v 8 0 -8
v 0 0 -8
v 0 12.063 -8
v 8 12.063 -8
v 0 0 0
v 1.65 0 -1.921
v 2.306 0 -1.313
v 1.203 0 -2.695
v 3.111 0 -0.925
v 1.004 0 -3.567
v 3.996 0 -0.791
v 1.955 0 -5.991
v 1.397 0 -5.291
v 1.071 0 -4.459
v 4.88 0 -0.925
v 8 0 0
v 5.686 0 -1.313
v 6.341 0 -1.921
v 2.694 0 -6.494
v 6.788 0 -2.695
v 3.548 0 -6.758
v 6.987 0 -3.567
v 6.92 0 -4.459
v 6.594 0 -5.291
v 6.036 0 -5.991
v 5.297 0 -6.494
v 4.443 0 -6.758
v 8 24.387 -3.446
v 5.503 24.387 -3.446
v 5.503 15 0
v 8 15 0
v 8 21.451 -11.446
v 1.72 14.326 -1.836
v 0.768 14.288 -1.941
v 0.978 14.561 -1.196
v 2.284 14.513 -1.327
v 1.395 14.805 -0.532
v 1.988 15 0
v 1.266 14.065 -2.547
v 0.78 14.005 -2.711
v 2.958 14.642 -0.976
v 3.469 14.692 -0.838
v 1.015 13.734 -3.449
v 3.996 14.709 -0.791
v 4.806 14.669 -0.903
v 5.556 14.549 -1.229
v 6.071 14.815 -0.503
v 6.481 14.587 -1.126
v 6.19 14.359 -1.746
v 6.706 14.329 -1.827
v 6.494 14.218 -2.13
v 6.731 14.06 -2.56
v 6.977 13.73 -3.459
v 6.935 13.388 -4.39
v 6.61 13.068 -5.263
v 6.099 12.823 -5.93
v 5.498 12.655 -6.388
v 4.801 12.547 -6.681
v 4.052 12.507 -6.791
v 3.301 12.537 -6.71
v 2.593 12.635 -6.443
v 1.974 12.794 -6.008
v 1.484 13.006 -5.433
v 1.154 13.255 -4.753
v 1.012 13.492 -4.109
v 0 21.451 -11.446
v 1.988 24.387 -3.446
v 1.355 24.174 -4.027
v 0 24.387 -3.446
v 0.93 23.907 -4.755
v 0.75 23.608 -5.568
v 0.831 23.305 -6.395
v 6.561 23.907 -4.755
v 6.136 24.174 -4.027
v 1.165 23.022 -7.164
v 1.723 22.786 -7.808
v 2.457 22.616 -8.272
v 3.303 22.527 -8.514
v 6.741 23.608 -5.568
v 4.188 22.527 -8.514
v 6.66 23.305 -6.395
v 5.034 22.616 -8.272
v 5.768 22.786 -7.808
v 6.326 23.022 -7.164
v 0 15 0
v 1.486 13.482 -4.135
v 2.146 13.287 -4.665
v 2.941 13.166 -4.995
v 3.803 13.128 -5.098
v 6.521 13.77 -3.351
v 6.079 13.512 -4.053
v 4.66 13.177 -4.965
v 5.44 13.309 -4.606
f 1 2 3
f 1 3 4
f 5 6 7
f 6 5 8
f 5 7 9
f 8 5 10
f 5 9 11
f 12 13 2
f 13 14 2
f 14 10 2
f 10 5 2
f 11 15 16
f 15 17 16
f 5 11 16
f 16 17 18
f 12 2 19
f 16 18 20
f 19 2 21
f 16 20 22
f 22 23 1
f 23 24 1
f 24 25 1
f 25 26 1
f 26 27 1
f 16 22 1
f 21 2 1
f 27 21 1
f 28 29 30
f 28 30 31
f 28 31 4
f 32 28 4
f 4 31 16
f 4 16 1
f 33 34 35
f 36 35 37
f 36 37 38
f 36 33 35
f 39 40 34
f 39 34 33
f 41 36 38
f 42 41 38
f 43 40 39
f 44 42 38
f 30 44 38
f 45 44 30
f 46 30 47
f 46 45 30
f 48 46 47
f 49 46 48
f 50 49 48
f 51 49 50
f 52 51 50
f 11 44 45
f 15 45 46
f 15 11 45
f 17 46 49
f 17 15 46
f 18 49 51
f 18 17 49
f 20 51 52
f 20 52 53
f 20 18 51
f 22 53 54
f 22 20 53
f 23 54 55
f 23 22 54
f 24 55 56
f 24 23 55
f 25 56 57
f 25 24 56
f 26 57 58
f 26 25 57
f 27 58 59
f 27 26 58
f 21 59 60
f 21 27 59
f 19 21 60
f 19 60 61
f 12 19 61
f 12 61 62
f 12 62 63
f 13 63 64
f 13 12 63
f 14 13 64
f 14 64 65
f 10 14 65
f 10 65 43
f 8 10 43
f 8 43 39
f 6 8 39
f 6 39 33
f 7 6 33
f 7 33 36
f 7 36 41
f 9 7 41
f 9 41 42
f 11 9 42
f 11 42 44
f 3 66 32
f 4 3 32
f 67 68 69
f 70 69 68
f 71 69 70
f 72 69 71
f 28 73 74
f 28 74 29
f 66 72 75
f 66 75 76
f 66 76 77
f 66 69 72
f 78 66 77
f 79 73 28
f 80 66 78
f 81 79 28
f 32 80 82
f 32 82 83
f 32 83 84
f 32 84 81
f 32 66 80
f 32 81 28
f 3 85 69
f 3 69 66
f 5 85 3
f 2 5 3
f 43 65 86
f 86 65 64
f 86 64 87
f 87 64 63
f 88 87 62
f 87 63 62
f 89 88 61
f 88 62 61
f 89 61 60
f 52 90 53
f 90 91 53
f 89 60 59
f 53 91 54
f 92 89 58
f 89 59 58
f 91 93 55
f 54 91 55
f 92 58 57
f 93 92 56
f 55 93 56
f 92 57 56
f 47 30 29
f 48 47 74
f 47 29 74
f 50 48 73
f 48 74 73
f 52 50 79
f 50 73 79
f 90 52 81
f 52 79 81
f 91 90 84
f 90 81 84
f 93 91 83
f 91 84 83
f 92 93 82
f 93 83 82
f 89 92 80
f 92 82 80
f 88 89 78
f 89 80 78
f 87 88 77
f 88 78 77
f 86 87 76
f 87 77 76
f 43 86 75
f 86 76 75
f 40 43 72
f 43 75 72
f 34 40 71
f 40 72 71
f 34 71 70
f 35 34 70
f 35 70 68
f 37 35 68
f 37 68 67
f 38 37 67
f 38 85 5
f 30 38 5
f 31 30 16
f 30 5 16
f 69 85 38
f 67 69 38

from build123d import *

# Parameters (mm, degrees)
SKETCH1_W           = 8
SKETCH1_H           = 8
SKETCH1_R           = 3
BOSS_EXTRUDE3_DEPTH = 15
CUT_EXTRUDE1_DEPTH  = 8
SKETCH4_W           = 8
SKETCH4_H           = 8.522050623
BOSS_EXTRUDE4_DEPTH = 10
SKETCH5_R           = 3
CUT_EXTRUDE2_DEPTH  = 10


with BuildPart() as part:
    # Sketch1 → Boss-Extrude3 (new body)
    with BuildSketch(Plane(origin=(0, 0, 0), x_dir=(1, 0, 0), z_dir=(0, 1, 0))):
        with Locations((4, 4)):
            Rectangle(SKETCH1_W, SKETCH1_H)
        with Locations(Location((3.995564868, 3.791433264, 0), (0, 0, 270))):
            Circle(SKETCH1_R, mode=Mode.SUBTRACT)
    extrude(amount=BOSS_EXTRUDE3_DEPTH)

    # Sketch3 → Cut-Extrude1 (cut)
    with BuildSketch(Plane.ZY):
        Polygon((-8, 15), (0, 15), (-8, 12.063105925), align=None)
    extrude(amount=-CUT_EXTRUDE1_DEPTH, mode=Mode.SUBTRACT)

    # Sketch4 → Boss-Extrude4 (add)
    with BuildSketch(Plane(origin=(0, 13.218525518, -4.852676159), x_dir=(1, 0, 0), z_dir=(0, 0.9387411967802677, -0.3446229323007264))):
        with Locations((4, -0.908318673)):
            Rectangle(SKETCH4_W, SKETCH4_H)
    extrude(amount=BOSS_EXTRUDE4_DEPTH)

    # Sketch5 → Cut-Extrude2 (cut)
    with BuildSketch(Plane(origin=(0, 22.605937486, -8.298905482), x_dir=(1, 0, 0), z_dir=(0, 0.9387411967802677, -0.34462293230072644))):
        with Locations((3.74552854, -2.73801251)):
            Circle(SKETCH5_R)
    extrude(amount=-CUT_EXTRUDE2_DEPTH, mode=Mode.SUBTRACT)


solid = part.part
